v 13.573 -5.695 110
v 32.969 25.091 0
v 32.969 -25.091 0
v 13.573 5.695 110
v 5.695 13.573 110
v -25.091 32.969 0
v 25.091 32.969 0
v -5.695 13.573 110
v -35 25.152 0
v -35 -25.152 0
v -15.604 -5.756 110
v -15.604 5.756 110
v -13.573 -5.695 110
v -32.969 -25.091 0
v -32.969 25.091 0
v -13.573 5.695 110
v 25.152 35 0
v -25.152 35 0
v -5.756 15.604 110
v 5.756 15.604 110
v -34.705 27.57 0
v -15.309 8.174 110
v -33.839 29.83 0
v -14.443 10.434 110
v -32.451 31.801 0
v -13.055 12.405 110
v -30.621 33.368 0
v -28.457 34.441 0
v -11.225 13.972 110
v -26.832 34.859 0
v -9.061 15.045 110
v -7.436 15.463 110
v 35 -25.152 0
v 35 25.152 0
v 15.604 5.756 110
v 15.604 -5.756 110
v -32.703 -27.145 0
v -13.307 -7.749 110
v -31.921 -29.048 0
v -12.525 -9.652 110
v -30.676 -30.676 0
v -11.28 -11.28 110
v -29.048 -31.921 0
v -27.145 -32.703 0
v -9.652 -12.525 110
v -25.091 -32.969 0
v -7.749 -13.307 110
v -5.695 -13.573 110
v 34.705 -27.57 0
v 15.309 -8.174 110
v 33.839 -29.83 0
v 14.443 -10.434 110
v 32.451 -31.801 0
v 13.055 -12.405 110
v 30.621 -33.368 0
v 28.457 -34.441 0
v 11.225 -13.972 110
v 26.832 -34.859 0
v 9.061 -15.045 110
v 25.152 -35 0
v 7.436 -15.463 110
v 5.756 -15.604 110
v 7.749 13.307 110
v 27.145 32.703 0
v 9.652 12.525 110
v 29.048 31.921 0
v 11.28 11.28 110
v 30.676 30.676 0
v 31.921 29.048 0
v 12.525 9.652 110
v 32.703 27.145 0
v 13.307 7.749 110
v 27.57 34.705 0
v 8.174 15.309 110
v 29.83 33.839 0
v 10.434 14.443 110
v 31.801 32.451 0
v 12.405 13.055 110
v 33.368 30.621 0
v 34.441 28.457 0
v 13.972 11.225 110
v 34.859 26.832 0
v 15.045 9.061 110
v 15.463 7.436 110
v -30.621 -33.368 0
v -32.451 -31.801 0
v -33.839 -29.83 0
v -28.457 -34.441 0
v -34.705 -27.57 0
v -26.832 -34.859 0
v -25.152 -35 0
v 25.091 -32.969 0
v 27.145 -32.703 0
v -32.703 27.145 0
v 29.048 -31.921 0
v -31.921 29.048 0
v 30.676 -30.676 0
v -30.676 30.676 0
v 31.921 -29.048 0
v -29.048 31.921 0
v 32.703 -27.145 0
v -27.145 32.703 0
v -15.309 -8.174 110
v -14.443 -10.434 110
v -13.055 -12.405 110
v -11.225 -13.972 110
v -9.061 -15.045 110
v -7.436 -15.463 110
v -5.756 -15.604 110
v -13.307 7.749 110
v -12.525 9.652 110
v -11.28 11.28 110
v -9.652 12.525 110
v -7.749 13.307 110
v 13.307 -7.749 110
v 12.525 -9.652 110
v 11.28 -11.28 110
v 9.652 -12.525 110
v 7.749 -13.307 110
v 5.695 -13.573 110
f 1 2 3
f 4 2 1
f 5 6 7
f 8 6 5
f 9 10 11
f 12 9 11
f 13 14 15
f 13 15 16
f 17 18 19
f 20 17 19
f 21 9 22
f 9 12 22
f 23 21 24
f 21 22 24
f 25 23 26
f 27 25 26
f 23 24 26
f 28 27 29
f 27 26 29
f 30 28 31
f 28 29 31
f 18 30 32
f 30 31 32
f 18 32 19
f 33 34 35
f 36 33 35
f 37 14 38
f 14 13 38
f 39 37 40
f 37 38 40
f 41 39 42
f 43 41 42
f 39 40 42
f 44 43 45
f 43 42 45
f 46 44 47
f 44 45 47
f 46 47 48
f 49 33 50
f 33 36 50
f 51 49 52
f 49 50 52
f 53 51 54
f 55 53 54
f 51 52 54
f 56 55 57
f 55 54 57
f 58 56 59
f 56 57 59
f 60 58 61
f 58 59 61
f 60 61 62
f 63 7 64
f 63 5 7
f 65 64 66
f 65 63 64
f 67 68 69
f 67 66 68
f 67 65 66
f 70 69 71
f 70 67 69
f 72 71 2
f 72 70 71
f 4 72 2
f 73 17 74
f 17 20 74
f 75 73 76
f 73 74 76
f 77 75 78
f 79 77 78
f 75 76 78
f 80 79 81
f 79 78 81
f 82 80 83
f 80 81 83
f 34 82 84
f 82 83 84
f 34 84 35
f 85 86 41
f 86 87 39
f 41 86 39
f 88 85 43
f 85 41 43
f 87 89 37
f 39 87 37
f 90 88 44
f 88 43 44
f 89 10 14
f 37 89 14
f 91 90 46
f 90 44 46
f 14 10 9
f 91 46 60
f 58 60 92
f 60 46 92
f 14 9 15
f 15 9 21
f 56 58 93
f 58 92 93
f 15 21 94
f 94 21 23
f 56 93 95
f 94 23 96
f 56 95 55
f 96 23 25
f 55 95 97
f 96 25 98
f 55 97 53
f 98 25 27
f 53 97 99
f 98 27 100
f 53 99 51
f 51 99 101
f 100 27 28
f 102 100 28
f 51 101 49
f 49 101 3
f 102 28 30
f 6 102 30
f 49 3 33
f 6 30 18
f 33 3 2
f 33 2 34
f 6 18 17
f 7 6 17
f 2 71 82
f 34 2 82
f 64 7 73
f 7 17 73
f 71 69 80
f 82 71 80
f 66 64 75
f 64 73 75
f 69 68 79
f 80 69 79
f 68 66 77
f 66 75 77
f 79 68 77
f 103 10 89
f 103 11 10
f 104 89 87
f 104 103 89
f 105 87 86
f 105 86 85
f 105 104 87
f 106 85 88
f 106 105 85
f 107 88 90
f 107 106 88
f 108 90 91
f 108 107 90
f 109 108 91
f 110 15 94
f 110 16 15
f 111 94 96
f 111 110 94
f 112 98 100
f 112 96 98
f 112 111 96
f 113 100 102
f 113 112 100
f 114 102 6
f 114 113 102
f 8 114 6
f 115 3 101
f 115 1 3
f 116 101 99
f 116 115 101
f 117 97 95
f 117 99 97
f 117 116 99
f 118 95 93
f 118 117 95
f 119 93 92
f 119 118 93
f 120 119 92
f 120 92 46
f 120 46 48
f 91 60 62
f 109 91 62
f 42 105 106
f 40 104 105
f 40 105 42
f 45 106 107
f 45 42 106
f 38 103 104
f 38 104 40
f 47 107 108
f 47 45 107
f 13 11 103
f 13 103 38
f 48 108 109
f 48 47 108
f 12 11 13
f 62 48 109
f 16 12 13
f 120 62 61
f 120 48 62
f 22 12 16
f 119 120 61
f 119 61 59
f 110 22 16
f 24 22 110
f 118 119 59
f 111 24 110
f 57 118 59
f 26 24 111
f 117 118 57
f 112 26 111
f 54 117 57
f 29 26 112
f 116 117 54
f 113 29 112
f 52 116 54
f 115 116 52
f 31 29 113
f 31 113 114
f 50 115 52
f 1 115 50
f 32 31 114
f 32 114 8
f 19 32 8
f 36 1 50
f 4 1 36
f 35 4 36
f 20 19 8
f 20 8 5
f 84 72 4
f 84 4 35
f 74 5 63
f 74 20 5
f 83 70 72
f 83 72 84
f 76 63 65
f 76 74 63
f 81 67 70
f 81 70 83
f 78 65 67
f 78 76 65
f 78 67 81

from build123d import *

# Parameters (mm, degrees)
F0_W     = 70
F0_H     = 70
F1_DEPTH = 110
F1_TAPER = 10
F2_R     = 10
F3_T     = -2


with BuildPart() as f1:
    # F0 (on Top) → F1 (new body)
    with BuildSketch(Plane.XY):
        Rectangle(F0_W, F0_H)
    extrude(amount=F1_DEPTH, taper=F1_TAPER)

    # F2
    f2_edges = [f1.edges().sort_by_distance(p)[0] for p in [
        (25.302016, -25.302016, 55),
        (25.302016, 25.302016, 55),
        (-25.302016, -25.302016, 55),
        (-25.302016, 25.302016, 55),
    ]]
    fillet(f2_edges, radius=F2_R)

    # F3
    f3_openings = [f1.faces().sort_by_distance(p)[0] for p in [
        (0, 0, 0),
        (0, 0, 110),
    ]]
    offset(amount=F3_T, openings=f3_openings)


solid = f1.part
